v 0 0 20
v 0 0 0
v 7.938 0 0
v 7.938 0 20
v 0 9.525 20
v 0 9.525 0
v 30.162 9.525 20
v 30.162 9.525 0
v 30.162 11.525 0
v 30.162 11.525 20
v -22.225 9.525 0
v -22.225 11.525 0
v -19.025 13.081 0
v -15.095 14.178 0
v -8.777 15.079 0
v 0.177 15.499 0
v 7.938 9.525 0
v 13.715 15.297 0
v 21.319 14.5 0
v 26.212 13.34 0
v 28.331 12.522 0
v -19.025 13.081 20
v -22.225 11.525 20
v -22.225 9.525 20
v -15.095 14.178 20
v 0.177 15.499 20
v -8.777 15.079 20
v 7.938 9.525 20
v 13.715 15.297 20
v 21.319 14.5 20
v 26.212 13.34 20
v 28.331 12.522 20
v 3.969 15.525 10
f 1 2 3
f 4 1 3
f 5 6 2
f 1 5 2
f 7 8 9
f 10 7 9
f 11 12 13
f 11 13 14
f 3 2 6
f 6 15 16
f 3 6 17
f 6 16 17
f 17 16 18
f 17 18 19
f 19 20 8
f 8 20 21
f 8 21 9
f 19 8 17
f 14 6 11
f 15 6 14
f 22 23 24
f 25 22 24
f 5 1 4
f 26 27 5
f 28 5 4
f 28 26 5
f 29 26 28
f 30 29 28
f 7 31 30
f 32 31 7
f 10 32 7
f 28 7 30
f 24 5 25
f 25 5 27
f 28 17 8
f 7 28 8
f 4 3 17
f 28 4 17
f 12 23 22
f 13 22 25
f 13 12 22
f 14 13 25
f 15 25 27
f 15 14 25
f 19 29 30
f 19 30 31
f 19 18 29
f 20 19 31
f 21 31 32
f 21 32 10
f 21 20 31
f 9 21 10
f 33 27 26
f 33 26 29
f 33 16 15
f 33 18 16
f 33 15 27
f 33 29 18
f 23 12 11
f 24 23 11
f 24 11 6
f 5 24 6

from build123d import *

# Parameters (mm, degrees)
F1_DEPTH = 20


with BuildPart() as f1:
    # F0 (on Top) → F1 (new body)
    with BuildSketch(Plane.XY):
        with BuildLine():
            Line((0, 9.525), (0, 0))
            Line((0, 0), (7.9375, 0))
            Line((7.9375, 0), (7.9375, 9.525))
            Line((7.9375, 9.525), (30.1625, 9.525))
            Line((30.1625, 9.525), (30.1625, 11.525))
            add(Edge.make_bspline(
                [(-22.225, 11.525), (-16.82, 15.041926), (3.968839, 16.008074), (24.757321, 15.041926), (30.1625, 11.525)],
                knots=[0, 0, 0, 0, 26.497406, 52.994813, 52.994813, 52.994813, 52.994813], degree=3))
            Line((-22.225, 11.525), (-22.225, 9.525))
            Line((-22.225, 9.525), (0, 9.525))
        make_face()
    extrude(amount=F1_DEPTH)


solid = f1.part
